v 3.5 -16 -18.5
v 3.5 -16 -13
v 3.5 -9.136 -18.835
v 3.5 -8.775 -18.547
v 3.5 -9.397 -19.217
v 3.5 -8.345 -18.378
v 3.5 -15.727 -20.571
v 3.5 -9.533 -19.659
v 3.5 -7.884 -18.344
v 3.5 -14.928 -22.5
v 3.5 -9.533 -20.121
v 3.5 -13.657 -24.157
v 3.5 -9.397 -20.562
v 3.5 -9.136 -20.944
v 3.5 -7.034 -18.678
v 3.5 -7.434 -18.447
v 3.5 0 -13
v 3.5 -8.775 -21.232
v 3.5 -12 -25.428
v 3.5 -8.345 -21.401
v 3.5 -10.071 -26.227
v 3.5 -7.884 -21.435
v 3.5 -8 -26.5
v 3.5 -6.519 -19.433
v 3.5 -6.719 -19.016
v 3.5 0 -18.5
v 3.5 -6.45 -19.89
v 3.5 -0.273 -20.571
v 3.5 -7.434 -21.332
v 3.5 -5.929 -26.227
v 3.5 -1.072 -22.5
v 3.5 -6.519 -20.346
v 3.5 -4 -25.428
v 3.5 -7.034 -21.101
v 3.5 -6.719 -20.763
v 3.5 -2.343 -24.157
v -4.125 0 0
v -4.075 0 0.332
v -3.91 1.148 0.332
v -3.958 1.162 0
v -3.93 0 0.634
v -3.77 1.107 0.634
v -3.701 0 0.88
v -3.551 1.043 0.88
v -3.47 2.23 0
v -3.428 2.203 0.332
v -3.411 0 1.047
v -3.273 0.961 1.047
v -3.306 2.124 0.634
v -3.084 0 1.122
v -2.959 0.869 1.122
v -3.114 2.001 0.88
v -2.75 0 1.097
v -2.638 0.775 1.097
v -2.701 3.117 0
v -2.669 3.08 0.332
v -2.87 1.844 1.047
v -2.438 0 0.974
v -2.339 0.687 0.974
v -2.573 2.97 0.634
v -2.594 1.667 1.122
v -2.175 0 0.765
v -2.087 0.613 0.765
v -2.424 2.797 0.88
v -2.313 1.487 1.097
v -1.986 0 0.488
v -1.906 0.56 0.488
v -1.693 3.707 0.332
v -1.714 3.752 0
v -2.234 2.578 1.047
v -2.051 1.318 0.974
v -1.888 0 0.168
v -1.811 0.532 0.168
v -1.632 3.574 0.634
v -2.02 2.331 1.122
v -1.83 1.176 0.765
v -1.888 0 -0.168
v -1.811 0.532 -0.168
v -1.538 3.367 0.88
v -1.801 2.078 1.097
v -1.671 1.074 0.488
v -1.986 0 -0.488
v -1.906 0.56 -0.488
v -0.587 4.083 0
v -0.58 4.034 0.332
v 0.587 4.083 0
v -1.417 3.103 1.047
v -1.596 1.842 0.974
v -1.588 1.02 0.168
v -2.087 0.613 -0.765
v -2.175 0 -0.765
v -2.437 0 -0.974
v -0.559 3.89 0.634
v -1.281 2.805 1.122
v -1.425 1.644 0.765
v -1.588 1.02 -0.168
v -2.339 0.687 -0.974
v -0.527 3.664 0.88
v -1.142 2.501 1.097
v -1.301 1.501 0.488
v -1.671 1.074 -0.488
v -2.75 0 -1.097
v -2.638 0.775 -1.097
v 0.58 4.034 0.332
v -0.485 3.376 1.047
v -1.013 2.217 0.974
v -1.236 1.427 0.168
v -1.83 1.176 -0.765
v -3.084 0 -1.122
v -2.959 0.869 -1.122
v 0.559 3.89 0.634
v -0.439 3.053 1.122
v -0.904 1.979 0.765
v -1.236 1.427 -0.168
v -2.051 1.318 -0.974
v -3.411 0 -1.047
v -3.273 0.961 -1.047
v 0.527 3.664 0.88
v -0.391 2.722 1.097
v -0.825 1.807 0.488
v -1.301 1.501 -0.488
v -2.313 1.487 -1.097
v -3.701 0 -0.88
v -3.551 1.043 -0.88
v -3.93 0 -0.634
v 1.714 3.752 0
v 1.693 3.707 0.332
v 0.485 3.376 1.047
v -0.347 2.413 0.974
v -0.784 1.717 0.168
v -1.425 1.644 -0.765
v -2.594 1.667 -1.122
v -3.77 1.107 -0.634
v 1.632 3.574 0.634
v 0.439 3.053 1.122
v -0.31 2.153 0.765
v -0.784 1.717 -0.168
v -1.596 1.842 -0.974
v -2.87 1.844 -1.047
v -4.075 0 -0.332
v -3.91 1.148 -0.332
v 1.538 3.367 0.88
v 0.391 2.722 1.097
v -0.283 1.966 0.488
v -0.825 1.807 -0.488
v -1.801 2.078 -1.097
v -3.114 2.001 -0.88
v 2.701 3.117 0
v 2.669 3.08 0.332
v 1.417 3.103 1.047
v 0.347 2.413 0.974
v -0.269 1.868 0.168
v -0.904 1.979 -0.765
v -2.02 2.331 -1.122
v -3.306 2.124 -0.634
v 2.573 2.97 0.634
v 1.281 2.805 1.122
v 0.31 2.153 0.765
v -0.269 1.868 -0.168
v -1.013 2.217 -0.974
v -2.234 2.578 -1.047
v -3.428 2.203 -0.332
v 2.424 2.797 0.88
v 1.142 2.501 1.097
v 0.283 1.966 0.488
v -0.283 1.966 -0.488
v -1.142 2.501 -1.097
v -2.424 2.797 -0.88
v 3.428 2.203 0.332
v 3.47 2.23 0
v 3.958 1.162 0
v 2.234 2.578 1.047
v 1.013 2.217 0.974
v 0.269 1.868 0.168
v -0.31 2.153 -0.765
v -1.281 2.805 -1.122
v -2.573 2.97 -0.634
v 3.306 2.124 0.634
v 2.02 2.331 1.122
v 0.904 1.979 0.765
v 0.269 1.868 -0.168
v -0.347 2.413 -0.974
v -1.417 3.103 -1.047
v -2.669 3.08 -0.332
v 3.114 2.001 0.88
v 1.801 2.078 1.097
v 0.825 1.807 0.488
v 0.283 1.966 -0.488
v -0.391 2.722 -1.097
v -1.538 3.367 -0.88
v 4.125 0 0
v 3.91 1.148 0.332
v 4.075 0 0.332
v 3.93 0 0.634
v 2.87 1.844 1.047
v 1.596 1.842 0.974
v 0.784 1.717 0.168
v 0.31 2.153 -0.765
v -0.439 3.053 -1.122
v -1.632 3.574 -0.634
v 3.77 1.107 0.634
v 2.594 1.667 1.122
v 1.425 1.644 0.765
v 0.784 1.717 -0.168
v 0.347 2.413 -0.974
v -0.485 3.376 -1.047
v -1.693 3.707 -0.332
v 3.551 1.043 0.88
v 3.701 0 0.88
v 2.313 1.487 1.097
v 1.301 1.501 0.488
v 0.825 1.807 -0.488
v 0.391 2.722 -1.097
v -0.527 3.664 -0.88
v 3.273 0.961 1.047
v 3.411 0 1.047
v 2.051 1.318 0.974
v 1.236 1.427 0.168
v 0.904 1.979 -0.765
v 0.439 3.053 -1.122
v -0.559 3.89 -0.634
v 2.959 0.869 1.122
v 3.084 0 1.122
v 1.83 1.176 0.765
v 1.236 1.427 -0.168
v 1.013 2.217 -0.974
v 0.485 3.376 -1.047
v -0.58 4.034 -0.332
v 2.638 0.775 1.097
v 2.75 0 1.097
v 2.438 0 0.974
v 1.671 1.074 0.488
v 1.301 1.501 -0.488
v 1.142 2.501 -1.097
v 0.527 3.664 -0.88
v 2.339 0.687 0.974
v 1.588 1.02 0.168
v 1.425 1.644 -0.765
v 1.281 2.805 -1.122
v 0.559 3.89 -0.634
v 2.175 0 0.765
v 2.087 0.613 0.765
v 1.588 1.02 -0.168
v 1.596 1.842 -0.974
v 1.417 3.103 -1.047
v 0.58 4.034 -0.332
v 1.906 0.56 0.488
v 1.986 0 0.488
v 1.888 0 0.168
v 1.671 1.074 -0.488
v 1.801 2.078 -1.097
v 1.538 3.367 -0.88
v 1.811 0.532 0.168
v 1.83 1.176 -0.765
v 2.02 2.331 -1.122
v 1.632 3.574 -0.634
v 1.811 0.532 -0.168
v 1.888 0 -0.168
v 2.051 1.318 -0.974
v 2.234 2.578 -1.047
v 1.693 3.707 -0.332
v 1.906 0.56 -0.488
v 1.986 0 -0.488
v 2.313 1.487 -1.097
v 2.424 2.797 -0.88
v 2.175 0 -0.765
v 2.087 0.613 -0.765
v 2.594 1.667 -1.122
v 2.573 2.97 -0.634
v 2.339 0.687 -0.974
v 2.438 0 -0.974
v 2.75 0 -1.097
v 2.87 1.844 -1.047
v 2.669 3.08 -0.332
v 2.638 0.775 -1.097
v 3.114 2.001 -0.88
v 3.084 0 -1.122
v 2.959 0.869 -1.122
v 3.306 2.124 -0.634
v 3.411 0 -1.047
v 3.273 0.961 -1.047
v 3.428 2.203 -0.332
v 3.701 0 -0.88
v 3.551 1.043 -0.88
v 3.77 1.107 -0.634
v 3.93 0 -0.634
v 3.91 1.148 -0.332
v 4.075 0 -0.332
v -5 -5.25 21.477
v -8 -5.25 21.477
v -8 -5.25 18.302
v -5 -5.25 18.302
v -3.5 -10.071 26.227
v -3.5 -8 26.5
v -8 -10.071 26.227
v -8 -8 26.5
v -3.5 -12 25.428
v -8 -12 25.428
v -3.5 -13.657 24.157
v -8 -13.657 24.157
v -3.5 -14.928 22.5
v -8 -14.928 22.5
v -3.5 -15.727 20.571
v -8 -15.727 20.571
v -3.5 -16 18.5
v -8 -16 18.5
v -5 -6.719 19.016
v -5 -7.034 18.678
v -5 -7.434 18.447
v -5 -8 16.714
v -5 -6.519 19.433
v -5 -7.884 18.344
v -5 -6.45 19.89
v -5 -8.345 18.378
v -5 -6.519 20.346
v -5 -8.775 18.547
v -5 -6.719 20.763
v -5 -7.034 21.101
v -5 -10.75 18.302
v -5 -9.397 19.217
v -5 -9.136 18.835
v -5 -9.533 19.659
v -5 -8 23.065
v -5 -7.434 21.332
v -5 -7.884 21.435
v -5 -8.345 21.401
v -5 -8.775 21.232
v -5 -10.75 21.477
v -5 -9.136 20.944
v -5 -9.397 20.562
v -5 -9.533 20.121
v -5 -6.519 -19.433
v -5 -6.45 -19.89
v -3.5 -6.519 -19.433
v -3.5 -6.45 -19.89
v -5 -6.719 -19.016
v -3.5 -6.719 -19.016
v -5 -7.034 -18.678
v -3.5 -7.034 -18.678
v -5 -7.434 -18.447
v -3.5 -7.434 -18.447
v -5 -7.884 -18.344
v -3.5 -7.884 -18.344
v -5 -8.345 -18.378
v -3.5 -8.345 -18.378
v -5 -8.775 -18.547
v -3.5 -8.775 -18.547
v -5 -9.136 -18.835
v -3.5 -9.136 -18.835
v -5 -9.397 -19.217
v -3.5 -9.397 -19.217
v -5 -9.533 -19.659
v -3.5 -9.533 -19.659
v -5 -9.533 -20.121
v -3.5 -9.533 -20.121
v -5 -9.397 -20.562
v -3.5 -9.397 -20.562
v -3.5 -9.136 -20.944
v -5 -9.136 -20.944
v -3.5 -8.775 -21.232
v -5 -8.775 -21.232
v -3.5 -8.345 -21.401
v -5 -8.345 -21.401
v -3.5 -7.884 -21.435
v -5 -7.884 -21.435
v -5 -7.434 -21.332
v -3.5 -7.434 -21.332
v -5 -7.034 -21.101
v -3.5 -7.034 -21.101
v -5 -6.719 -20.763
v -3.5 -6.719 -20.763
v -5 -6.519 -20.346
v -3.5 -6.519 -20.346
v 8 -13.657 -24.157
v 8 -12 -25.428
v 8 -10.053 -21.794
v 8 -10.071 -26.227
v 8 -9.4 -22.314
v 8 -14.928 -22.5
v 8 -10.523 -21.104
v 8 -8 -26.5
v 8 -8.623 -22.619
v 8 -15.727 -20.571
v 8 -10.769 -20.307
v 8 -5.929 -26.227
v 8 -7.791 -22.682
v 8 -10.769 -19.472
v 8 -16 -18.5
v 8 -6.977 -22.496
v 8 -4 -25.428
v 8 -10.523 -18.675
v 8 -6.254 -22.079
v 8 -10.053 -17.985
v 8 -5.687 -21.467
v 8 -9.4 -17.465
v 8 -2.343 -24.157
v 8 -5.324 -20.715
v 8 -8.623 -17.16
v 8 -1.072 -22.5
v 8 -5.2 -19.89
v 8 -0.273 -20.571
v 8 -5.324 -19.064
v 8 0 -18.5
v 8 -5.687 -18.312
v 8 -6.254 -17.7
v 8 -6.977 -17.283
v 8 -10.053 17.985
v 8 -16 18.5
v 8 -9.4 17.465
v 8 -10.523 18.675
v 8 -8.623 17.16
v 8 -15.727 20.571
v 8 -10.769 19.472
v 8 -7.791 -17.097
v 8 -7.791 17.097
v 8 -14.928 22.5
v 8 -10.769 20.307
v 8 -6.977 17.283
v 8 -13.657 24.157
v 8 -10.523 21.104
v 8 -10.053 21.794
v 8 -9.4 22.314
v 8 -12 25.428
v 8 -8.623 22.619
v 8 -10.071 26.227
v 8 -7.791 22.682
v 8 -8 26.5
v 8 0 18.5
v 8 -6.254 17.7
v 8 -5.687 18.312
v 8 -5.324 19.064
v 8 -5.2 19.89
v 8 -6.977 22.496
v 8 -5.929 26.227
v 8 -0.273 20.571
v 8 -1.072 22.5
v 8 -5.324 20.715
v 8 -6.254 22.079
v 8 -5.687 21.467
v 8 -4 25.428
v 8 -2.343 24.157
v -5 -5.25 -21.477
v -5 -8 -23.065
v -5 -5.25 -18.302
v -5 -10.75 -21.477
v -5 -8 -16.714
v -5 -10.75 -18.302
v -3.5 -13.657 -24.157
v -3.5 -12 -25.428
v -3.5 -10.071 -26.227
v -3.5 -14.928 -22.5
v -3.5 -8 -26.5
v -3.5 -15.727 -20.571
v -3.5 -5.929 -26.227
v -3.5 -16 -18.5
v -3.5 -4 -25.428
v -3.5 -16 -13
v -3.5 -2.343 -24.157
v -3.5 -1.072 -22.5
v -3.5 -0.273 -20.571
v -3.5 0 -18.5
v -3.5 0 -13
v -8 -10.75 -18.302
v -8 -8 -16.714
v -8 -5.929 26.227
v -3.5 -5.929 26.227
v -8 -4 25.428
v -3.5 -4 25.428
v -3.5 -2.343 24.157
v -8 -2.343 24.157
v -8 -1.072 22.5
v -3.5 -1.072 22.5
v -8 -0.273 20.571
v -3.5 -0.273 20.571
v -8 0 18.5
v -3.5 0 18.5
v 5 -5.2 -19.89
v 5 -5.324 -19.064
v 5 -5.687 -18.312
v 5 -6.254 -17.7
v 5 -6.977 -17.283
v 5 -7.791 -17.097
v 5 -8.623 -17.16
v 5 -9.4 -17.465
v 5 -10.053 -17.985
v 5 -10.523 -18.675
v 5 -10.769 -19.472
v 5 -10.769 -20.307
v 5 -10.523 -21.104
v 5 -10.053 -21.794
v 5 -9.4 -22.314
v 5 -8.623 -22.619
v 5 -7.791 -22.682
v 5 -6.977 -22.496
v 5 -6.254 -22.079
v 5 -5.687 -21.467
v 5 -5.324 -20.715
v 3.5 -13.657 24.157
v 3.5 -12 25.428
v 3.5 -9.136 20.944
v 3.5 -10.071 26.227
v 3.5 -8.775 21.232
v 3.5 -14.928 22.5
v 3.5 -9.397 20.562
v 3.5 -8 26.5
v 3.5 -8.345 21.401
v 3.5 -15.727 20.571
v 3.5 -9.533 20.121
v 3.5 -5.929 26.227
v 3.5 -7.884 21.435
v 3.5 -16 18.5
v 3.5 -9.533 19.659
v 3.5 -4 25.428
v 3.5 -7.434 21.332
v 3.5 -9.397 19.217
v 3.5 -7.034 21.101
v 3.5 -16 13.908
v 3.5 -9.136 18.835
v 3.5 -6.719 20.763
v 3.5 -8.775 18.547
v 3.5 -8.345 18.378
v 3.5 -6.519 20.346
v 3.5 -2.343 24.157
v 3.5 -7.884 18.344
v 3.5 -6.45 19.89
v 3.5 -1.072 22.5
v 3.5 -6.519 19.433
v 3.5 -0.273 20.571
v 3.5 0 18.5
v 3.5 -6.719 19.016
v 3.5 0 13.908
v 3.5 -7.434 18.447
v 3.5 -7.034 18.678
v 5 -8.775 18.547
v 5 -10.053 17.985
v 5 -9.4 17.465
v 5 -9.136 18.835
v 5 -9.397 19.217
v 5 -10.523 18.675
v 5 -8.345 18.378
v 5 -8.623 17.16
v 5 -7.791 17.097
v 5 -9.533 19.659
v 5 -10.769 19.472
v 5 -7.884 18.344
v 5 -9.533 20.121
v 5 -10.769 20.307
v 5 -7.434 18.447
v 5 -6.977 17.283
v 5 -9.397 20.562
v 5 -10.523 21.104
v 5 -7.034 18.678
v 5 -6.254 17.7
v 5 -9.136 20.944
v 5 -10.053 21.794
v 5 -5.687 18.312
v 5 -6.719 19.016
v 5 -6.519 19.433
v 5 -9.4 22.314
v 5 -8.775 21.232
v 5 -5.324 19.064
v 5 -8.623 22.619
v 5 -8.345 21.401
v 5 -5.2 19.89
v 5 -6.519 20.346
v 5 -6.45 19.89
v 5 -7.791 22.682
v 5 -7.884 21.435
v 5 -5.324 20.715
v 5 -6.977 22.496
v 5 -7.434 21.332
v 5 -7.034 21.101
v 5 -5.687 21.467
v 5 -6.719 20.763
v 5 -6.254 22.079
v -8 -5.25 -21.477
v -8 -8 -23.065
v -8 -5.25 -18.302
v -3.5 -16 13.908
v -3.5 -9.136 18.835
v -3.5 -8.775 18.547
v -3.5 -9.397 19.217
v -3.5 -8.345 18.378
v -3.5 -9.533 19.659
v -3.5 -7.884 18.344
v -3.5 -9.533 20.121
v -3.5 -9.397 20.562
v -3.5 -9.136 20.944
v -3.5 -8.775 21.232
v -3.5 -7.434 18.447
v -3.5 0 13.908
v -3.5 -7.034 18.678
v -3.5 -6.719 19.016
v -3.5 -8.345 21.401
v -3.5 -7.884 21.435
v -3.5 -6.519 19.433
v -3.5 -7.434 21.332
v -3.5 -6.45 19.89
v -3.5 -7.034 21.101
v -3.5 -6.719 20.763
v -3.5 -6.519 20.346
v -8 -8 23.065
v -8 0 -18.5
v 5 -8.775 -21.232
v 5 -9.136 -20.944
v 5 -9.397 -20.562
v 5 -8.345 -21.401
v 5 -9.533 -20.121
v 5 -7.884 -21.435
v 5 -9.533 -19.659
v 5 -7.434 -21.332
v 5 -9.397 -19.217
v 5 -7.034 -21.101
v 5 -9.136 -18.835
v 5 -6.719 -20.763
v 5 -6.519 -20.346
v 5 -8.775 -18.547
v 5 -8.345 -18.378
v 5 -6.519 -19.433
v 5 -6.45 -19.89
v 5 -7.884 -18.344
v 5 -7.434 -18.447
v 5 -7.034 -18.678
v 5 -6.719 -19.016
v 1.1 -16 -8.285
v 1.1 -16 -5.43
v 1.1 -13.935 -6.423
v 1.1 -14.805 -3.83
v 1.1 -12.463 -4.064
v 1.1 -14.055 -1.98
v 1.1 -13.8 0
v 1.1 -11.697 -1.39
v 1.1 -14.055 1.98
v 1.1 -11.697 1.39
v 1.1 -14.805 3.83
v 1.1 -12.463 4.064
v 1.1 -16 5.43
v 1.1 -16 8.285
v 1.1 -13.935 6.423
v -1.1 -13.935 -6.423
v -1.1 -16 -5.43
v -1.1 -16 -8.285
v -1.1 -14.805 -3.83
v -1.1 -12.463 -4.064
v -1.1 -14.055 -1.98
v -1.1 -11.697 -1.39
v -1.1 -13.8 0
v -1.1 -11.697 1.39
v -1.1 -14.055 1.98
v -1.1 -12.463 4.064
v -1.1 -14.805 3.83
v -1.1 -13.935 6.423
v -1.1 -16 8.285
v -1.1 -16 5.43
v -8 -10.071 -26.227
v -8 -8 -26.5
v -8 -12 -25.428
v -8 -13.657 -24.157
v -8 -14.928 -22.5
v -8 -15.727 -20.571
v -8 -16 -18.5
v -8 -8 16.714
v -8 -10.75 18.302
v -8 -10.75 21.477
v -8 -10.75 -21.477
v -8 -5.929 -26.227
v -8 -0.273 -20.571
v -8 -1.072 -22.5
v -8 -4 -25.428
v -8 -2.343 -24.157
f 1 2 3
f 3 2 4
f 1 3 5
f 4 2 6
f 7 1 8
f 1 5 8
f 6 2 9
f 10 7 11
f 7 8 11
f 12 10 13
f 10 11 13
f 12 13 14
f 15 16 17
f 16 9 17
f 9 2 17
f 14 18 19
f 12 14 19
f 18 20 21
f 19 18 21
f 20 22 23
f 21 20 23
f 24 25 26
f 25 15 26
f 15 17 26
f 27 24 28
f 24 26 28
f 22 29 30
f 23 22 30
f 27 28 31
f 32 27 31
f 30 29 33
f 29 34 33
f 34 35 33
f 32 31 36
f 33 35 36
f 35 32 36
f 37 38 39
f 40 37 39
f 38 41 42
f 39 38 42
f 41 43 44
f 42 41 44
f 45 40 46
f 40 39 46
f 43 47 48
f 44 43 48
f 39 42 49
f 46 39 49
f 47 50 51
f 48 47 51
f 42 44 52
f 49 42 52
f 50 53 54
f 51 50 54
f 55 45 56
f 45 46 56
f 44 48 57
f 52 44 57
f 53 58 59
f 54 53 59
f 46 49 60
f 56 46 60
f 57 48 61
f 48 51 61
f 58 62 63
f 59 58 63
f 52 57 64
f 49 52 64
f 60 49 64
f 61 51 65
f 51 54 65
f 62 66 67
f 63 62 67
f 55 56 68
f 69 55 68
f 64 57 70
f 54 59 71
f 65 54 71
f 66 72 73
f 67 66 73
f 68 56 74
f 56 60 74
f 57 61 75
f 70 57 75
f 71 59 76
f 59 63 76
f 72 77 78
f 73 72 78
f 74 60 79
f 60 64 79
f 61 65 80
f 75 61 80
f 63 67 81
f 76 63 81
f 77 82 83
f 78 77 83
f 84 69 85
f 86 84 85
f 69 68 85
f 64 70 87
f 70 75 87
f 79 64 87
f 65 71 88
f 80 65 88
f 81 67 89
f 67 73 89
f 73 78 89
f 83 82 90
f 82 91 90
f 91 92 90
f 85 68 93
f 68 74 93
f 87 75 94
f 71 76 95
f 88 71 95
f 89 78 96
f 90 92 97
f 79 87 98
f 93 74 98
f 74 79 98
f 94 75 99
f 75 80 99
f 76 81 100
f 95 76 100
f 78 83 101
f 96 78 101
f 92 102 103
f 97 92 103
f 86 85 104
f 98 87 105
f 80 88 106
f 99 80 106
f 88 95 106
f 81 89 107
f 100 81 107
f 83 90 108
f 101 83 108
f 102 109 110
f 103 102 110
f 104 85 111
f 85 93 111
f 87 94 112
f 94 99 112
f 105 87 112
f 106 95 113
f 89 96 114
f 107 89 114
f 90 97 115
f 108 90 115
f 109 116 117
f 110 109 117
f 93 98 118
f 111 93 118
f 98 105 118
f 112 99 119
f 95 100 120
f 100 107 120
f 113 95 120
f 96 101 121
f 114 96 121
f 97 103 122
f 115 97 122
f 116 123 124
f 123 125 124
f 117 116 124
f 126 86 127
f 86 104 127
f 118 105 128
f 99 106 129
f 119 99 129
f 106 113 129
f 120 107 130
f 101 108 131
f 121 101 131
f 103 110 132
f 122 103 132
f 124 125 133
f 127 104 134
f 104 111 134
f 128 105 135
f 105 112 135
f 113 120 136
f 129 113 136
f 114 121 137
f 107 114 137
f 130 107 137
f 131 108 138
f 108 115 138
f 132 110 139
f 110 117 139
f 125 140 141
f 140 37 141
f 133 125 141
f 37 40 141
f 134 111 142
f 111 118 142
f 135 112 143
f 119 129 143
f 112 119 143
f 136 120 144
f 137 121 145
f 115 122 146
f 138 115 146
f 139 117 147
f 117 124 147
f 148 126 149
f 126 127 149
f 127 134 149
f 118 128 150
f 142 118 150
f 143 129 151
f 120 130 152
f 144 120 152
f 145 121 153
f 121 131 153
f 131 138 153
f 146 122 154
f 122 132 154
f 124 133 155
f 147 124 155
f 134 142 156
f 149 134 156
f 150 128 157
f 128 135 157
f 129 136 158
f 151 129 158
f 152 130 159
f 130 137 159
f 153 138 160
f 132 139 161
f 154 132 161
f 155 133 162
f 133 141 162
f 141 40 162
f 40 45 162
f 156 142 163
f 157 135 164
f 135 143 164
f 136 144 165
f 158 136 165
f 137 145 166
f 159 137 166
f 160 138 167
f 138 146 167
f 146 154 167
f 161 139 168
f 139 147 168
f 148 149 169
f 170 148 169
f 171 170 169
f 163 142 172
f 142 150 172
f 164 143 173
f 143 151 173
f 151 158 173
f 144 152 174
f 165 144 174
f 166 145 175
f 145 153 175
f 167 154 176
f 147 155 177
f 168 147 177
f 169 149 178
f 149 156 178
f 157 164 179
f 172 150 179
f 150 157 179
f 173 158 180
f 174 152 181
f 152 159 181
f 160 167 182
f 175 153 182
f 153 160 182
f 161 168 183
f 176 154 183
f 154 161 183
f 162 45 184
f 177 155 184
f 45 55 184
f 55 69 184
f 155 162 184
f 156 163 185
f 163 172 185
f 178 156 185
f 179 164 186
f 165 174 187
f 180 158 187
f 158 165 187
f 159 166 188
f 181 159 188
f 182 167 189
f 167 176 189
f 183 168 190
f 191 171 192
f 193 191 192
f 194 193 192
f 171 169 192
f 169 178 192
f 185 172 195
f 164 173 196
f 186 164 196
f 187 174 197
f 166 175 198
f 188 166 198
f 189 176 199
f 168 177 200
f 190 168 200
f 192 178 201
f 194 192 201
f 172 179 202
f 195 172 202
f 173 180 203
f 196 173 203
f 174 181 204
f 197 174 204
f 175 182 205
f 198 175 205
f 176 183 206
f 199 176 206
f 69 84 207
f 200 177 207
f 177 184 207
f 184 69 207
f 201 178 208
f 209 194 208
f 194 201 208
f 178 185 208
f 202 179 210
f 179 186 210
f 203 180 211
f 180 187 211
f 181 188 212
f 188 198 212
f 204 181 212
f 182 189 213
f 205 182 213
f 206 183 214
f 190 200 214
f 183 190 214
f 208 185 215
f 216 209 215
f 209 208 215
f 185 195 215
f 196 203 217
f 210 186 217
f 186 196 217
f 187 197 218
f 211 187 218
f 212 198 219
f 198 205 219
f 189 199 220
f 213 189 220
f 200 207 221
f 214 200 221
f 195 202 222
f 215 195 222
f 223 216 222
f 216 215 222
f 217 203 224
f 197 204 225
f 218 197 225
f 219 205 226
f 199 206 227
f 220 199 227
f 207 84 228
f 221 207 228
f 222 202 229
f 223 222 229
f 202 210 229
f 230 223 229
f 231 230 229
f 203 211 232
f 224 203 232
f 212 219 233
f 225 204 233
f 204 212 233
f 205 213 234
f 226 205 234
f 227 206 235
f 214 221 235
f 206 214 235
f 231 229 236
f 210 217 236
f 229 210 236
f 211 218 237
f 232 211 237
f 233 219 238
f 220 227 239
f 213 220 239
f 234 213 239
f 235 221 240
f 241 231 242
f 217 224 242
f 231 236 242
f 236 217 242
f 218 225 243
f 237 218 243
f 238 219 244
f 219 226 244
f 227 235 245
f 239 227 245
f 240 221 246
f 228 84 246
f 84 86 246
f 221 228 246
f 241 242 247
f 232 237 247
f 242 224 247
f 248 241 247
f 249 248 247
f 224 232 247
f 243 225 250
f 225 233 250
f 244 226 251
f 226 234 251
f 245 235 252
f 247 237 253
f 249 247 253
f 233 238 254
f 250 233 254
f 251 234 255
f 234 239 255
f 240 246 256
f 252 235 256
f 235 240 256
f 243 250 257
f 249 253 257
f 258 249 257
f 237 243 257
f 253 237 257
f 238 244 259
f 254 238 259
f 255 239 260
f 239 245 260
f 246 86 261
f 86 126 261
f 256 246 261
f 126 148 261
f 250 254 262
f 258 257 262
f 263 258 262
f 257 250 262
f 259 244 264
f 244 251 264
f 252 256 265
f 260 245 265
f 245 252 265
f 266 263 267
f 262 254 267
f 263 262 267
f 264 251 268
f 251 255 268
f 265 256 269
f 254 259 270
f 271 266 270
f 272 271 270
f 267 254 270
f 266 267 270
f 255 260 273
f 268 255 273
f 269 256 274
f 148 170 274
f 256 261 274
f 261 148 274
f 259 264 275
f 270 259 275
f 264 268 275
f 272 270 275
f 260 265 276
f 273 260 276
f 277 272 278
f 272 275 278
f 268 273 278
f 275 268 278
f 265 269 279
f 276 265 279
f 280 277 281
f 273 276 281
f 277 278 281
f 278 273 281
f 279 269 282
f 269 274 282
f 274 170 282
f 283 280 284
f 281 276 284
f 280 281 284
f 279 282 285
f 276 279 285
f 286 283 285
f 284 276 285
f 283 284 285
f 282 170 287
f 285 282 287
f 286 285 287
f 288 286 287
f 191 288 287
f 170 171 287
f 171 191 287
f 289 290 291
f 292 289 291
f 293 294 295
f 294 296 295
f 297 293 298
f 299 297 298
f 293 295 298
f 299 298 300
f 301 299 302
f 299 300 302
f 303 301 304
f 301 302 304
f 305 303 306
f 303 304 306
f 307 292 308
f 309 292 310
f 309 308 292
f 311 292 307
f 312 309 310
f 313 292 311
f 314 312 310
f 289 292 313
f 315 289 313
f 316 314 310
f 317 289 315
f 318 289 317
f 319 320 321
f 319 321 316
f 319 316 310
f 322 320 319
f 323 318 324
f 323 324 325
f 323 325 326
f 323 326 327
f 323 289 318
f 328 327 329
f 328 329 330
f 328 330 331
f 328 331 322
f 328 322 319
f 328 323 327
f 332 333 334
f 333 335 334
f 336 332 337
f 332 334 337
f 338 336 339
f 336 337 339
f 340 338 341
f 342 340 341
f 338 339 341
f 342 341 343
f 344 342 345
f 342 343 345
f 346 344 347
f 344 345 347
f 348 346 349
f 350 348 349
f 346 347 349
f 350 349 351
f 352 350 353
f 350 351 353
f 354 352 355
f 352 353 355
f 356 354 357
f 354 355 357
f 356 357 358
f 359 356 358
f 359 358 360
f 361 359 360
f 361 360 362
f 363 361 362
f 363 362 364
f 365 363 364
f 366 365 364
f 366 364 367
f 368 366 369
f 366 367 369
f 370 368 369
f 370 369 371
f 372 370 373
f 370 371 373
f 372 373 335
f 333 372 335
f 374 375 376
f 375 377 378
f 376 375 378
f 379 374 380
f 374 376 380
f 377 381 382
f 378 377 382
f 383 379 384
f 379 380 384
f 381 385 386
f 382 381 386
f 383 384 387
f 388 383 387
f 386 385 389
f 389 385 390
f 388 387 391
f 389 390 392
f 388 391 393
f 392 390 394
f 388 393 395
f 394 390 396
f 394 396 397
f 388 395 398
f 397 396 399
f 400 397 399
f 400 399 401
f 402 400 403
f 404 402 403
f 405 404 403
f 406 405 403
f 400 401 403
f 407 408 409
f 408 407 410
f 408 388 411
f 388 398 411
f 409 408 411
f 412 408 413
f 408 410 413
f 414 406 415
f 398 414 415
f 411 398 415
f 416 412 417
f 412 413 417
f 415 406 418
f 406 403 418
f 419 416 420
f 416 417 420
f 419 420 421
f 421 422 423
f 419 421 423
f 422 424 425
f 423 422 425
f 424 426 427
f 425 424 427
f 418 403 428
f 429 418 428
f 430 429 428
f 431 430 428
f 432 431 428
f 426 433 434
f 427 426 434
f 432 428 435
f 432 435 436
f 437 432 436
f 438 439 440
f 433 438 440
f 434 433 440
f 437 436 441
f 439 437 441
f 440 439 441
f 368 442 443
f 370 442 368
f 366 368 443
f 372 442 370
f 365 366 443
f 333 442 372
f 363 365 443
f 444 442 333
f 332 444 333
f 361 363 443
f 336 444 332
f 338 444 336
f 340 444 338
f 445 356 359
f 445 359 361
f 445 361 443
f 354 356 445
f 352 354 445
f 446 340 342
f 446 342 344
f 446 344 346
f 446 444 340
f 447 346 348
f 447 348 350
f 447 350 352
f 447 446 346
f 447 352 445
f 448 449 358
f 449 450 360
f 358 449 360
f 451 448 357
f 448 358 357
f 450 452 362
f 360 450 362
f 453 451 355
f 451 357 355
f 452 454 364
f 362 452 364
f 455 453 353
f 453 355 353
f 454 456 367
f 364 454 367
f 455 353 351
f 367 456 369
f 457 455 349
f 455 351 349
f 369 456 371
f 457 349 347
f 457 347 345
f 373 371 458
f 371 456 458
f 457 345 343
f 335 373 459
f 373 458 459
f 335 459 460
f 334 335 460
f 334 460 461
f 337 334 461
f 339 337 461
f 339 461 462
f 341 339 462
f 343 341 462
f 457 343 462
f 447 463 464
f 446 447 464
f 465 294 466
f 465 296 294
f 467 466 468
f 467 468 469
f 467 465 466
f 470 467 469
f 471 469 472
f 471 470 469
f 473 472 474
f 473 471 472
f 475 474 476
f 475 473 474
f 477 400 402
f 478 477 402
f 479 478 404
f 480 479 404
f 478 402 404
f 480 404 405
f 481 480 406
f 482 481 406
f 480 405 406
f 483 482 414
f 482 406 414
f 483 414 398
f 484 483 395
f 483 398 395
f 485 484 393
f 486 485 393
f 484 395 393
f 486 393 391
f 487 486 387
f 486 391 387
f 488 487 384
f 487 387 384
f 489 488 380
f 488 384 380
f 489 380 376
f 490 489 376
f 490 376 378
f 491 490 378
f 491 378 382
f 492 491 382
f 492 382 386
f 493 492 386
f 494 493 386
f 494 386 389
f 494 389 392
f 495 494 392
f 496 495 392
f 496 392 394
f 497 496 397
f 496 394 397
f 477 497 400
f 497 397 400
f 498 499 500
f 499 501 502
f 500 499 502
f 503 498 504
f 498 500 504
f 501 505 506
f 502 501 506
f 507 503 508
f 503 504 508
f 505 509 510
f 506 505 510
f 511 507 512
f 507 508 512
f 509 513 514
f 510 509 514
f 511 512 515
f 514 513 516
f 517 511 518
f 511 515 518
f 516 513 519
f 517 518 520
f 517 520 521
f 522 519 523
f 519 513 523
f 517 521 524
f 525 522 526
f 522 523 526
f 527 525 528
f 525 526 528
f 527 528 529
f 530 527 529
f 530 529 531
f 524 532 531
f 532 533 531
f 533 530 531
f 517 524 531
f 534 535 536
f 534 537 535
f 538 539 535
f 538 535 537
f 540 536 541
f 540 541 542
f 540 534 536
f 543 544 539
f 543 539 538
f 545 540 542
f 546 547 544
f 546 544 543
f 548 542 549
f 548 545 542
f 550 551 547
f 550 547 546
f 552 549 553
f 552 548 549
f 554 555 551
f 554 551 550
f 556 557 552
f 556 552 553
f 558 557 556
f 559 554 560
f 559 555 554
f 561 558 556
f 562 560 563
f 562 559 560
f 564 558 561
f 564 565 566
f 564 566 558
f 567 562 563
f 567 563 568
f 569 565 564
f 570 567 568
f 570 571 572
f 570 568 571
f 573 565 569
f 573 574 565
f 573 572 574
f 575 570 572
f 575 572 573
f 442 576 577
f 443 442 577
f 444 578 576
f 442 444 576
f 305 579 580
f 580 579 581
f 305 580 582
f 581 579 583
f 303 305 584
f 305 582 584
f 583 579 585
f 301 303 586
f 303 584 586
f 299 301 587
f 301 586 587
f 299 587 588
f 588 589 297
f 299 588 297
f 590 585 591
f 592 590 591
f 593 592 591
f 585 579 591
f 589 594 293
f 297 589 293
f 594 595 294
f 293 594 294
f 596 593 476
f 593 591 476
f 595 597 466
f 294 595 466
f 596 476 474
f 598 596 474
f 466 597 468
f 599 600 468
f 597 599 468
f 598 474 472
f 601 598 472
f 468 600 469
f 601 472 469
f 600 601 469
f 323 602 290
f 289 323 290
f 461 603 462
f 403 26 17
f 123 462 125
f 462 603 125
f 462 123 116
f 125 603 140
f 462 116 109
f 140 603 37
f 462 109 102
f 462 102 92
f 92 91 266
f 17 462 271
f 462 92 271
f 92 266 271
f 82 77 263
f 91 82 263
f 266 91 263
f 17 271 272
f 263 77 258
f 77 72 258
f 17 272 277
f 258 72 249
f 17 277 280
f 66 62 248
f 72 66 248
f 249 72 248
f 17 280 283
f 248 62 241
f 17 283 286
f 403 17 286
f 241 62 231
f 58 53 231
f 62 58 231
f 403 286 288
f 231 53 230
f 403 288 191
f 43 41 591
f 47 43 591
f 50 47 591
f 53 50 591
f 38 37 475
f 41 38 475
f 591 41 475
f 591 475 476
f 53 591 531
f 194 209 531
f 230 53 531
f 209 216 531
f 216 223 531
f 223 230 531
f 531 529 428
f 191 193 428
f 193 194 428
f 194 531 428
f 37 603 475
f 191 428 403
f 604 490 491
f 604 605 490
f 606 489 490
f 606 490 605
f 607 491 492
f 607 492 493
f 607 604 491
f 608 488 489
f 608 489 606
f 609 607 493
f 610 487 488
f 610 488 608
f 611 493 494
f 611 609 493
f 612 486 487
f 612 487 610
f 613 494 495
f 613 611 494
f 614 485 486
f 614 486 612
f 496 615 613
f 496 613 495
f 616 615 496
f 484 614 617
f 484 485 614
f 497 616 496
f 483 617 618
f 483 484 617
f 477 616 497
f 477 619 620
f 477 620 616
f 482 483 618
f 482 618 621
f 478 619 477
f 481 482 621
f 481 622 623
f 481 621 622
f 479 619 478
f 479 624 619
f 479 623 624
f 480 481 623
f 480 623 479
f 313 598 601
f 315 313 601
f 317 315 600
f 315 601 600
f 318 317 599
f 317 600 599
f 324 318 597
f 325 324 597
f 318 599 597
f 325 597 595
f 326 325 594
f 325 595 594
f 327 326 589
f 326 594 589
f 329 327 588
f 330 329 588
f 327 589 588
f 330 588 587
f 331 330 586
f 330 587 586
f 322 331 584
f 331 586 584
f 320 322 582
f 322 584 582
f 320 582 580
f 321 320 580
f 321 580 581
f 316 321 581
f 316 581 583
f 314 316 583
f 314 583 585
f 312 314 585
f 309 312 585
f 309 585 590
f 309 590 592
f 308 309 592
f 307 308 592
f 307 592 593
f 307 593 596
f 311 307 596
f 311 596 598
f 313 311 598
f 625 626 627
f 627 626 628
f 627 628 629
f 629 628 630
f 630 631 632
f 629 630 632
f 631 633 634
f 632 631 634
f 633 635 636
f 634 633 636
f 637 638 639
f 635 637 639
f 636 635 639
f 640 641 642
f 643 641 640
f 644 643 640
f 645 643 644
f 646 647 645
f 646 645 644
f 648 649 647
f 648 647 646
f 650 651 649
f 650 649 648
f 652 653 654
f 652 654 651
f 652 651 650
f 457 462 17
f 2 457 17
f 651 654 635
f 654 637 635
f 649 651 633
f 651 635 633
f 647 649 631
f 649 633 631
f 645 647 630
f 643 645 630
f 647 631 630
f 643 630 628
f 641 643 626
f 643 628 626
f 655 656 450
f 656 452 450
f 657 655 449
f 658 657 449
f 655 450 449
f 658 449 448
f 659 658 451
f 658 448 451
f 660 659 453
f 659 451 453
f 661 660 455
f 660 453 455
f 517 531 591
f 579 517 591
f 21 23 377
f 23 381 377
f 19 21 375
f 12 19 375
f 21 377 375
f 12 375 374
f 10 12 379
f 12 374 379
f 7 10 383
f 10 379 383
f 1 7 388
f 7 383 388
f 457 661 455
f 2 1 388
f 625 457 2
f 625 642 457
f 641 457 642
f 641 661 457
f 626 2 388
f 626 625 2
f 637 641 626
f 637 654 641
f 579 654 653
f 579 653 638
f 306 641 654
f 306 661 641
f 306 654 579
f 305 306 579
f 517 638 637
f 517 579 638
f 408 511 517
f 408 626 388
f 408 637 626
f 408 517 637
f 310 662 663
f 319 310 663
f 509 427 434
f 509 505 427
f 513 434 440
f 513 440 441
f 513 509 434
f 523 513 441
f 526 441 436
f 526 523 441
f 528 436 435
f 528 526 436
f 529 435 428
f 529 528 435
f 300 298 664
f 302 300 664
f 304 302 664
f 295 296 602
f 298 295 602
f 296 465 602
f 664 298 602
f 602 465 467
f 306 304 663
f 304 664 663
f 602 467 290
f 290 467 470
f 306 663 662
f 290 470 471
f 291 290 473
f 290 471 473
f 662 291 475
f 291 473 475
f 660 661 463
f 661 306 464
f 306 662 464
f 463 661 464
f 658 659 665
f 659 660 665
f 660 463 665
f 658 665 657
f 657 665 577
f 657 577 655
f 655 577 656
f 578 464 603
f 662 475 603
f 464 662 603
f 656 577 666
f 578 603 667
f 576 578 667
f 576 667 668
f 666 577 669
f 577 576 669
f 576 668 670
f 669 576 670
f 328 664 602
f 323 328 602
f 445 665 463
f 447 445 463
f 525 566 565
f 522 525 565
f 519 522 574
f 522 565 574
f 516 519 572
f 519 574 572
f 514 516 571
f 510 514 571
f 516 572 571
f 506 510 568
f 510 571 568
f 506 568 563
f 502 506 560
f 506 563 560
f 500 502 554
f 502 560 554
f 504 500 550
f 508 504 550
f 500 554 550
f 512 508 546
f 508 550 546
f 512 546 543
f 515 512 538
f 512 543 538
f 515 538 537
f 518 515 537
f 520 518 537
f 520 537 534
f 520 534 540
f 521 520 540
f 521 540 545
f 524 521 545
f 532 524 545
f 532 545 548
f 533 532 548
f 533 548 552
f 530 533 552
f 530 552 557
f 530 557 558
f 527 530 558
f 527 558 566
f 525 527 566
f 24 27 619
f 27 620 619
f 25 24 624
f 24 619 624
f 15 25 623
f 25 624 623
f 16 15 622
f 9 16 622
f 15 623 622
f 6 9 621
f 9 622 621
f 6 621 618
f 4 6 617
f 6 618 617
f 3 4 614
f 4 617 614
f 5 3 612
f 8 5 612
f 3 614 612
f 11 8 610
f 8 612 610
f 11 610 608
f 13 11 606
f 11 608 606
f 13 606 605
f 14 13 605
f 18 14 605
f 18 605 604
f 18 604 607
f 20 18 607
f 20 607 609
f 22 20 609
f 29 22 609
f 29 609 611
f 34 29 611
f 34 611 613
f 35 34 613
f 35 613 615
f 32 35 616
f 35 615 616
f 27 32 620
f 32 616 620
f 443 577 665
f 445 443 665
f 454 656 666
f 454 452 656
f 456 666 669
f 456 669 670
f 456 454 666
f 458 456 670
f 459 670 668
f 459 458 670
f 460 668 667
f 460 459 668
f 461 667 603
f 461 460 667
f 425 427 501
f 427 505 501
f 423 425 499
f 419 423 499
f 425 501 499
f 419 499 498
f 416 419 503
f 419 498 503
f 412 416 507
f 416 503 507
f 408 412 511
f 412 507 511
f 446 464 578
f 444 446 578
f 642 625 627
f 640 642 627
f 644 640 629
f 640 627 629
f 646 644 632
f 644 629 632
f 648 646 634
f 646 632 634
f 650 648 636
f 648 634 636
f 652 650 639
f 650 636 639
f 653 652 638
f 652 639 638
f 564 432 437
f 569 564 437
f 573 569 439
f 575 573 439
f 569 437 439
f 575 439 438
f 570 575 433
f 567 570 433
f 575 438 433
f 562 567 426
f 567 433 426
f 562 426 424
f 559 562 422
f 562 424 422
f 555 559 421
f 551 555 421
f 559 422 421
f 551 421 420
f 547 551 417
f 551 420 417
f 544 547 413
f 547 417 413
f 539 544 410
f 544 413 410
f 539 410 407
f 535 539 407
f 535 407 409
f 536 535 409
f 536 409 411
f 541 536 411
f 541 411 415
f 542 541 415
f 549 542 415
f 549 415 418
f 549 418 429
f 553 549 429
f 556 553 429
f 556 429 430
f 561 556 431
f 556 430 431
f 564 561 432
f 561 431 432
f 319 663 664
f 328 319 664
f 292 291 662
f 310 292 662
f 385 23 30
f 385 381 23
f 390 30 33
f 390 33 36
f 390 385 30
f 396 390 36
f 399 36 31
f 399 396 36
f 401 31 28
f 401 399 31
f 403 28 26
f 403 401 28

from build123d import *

# Parameters (mm, degrees)
F1_DEPTH  = 16
F2_R      = 7.99999
F3_R      = 1.55
F4_DEPTH  = 12.5
F5_DEPTH  = 25
F6_R      = 2.8
F7_DEPTH  = 3
F9_DEPTH  = 3
F10_R     = 1.125
F12_R     = 1.125
F15_DEPTH = 12.5
F17_DEPTH = 1.1


# Not quite as in the source:
# - a fillet or chamfer is up to 0.001 mm smaller than in the source, because OpenCascade refuses the exact size


with BuildPart() as f1:
    # F0 (on Front) → F1 (new body)
    with BuildSketch(Plane.XZ):
        Polygon((8, -18), (8, 18), (8, 26.5), (3.5, 26.5), (3.5, 13.9081878588), (-3.5, 13.9081878588), (-3.5, 26.5), (-8, 26.5), (-8, 18), (-8, -18), (-8, -26.5), (-3.5, -26.5), (-3.5, -18), (-3.5, -13), (3.5, -13), (3.5, -18), (3.5, -26.5), (8, -26.5), align=None)
    extrude(amount=F1_DEPTH)

    # F2 (radius 8 in the source; OpenCascade refuses exactly that, so slightly less here)
    f2_edges = [f1.edges().sort_by_distance(p)[0] for p in [
        (5.75, -16, 26.5),
        (-5.75, -16, 26.5),
        (-5.75, 0, 26.5),
        (5.75, 0, 26.5),
        (5.75, -16, -26.5),
        (-5.75, -16, -26.5),
        (5.75, 0, -26.5),
        (-5.75, 0, -26.5),
    ]]
    fillet(f2_edges, radius=F2_R)

    # F3 (on face) → F4 (cut, symmetric)
    with BuildSketch(Plane.YZ.offset(8)):
        with Locations((-8, 19.8896080256)):
            Circle(F3_R)
        with Locations((-8, -19.8896080256)):
            Circle(F3_R)
    extrude(amount=F4_DEPTH, both=True, mode=Mode.SUBTRACT)

    # F3 (on face) → F5 (cut)
    with BuildSketch(Plane.YZ.offset(8)):
        with Locations((-8, 19.8896080256)):
            Circle(F3_R)
        with Locations((-8, -19.8896080256)):
            Circle(F3_R)
    extrude(amount=-F5_DEPTH, mode=Mode.SUBTRACT)

    # F6 (on face) → F7 (cut)
    with BuildSketch(Plane.YZ.offset(8)):
        with Locations((-8, 19.8896080256)):
            Circle(F6_R)
        with Locations((-8, -19.8896080256)):
            Circle(F6_R)
    extrude(amount=-F7_DEPTH, mode=Mode.SUBTRACT)

    # F8 (on face) → F9 (cut)
    with BuildSketch(Plane(origin=(-8, 0, 0), x_dir=(0, -1, 0), z_dir=(-1, 0, 0))):
        Polygon((10.75, 18.3018947853), (10.75, 21.4773212658), (8, 23.0650345061), (5.25, 21.4773212658), (5.25, 18.3018947853), (8, 16.714181545), align=None)
        Polygon((5.25, -18.3018947853), (5.25, -21.4773212658), (8, -23.0650345061), (10.75, -21.4773212658), (10.75, -18.3018947853), (8, -16.714181545), align=None)
    extrude(amount=-F9_DEPTH, mode=Mode.SUBTRACT)

    # F10 (on face) → F11 (revolve)
    with BuildSketch(Plane.XZ.offset(16)):
        with Locations((-3, 0)):
            Circle(F10_R)
    revolve(axis=Axis((0, -16, 0.0619328348), (0, 0, -1)))

    # F12 (on face) → F13 (revolve)
    with BuildSketch(Plane(origin=(0, 0, 0), x_dir=(-1, 0, 0), z_dir=(0, 1, 0))):
        with Locations((3, 0)):
            Circle(F12_R)
    revolve(axis=Axis((0, 0, 0.5132202059), (0, 0, -1)))

    # F14 (on Top) → F15 (cut, symmetric)
    with BuildSketch(Plane.XY):
        Polygon((1.875, -16), (-1.875, -16), (-4.125, -16), (-8, -16), (-8, -21.5492993593), (8, -21.5492993593), (8, -16), (4.125, -16), align=None)
    extrude(amount=F15_DEPTH, both=True, mode=Mode.SUBTRACT)

    # F16 (on Right) → F17 (cut, symmetric)
    with BuildSketch(Plane.YZ):
        with BuildLine():
            Line((-16, -5.4295487842), (-16, -8.2849260709))
            ThreePointArc((-16, -8.2849260709), (-11.6, 0), (-16, 8.2849260709))
            Line((-16, 8.2849260709), (-16, 5.4295487842))
            ThreePointArc((-16, 5.4295487842), (-13.8, 0), (-16, -5.4295487842))
        make_face()
    extrude(amount=F17_DEPTH, both=True, mode=Mode.SUBTRACT)


solid = f1.part
